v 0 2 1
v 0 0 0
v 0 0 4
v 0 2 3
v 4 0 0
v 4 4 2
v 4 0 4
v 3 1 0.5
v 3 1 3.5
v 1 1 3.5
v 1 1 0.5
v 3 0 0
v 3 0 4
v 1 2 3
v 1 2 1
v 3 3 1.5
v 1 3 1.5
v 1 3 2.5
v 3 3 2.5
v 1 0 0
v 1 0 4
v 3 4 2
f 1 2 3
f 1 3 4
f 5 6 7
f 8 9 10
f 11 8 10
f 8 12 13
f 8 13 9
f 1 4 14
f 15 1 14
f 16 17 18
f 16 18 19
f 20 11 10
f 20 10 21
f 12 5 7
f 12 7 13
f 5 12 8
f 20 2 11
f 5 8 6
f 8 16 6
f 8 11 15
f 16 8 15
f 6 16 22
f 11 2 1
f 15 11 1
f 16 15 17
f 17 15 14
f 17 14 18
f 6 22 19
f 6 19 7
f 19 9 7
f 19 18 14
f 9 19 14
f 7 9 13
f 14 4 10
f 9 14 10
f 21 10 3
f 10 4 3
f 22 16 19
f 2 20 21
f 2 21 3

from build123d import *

# Parameters (mm, degrees)
BOSS_EXTRUDE1_DEPTH = 4
CUT_EXTRUDE2_DEPTH  = 10


with BuildPart() as part:
    # Sketch1 → Boss-Extrude1 (new body)
    with BuildSketch(Plane.XY):
        Polygon((0, 0), (0, 2), (1, 2), (1, 3), (3, 3), (3, 4), (4, 4), (4, 0), (3, 0), (3, 1), (1, 1), (1, 0), align=None)
    extrude(amount=BOSS_EXTRUDE1_DEPTH)

    # Sketch3 → Cut-Extrude2 (cut)
    with BuildSketch(Plane.ZY):
        Polygon((1, 2), (2, 4), (0, 4), (0, 2), align=None)
        Polygon((0, 0), (1, 2), (0, 2), align=None)
        Polygon((2, 4), (3, 2), (4, 2), (4, 4), align=None)
        Polygon((3, 2), (4, 0), (4, 2), align=None)
    extrude(amount=-CUT_EXTRUDE2_DEPTH, mode=Mode.SUBTRACT)


solid = part.part
